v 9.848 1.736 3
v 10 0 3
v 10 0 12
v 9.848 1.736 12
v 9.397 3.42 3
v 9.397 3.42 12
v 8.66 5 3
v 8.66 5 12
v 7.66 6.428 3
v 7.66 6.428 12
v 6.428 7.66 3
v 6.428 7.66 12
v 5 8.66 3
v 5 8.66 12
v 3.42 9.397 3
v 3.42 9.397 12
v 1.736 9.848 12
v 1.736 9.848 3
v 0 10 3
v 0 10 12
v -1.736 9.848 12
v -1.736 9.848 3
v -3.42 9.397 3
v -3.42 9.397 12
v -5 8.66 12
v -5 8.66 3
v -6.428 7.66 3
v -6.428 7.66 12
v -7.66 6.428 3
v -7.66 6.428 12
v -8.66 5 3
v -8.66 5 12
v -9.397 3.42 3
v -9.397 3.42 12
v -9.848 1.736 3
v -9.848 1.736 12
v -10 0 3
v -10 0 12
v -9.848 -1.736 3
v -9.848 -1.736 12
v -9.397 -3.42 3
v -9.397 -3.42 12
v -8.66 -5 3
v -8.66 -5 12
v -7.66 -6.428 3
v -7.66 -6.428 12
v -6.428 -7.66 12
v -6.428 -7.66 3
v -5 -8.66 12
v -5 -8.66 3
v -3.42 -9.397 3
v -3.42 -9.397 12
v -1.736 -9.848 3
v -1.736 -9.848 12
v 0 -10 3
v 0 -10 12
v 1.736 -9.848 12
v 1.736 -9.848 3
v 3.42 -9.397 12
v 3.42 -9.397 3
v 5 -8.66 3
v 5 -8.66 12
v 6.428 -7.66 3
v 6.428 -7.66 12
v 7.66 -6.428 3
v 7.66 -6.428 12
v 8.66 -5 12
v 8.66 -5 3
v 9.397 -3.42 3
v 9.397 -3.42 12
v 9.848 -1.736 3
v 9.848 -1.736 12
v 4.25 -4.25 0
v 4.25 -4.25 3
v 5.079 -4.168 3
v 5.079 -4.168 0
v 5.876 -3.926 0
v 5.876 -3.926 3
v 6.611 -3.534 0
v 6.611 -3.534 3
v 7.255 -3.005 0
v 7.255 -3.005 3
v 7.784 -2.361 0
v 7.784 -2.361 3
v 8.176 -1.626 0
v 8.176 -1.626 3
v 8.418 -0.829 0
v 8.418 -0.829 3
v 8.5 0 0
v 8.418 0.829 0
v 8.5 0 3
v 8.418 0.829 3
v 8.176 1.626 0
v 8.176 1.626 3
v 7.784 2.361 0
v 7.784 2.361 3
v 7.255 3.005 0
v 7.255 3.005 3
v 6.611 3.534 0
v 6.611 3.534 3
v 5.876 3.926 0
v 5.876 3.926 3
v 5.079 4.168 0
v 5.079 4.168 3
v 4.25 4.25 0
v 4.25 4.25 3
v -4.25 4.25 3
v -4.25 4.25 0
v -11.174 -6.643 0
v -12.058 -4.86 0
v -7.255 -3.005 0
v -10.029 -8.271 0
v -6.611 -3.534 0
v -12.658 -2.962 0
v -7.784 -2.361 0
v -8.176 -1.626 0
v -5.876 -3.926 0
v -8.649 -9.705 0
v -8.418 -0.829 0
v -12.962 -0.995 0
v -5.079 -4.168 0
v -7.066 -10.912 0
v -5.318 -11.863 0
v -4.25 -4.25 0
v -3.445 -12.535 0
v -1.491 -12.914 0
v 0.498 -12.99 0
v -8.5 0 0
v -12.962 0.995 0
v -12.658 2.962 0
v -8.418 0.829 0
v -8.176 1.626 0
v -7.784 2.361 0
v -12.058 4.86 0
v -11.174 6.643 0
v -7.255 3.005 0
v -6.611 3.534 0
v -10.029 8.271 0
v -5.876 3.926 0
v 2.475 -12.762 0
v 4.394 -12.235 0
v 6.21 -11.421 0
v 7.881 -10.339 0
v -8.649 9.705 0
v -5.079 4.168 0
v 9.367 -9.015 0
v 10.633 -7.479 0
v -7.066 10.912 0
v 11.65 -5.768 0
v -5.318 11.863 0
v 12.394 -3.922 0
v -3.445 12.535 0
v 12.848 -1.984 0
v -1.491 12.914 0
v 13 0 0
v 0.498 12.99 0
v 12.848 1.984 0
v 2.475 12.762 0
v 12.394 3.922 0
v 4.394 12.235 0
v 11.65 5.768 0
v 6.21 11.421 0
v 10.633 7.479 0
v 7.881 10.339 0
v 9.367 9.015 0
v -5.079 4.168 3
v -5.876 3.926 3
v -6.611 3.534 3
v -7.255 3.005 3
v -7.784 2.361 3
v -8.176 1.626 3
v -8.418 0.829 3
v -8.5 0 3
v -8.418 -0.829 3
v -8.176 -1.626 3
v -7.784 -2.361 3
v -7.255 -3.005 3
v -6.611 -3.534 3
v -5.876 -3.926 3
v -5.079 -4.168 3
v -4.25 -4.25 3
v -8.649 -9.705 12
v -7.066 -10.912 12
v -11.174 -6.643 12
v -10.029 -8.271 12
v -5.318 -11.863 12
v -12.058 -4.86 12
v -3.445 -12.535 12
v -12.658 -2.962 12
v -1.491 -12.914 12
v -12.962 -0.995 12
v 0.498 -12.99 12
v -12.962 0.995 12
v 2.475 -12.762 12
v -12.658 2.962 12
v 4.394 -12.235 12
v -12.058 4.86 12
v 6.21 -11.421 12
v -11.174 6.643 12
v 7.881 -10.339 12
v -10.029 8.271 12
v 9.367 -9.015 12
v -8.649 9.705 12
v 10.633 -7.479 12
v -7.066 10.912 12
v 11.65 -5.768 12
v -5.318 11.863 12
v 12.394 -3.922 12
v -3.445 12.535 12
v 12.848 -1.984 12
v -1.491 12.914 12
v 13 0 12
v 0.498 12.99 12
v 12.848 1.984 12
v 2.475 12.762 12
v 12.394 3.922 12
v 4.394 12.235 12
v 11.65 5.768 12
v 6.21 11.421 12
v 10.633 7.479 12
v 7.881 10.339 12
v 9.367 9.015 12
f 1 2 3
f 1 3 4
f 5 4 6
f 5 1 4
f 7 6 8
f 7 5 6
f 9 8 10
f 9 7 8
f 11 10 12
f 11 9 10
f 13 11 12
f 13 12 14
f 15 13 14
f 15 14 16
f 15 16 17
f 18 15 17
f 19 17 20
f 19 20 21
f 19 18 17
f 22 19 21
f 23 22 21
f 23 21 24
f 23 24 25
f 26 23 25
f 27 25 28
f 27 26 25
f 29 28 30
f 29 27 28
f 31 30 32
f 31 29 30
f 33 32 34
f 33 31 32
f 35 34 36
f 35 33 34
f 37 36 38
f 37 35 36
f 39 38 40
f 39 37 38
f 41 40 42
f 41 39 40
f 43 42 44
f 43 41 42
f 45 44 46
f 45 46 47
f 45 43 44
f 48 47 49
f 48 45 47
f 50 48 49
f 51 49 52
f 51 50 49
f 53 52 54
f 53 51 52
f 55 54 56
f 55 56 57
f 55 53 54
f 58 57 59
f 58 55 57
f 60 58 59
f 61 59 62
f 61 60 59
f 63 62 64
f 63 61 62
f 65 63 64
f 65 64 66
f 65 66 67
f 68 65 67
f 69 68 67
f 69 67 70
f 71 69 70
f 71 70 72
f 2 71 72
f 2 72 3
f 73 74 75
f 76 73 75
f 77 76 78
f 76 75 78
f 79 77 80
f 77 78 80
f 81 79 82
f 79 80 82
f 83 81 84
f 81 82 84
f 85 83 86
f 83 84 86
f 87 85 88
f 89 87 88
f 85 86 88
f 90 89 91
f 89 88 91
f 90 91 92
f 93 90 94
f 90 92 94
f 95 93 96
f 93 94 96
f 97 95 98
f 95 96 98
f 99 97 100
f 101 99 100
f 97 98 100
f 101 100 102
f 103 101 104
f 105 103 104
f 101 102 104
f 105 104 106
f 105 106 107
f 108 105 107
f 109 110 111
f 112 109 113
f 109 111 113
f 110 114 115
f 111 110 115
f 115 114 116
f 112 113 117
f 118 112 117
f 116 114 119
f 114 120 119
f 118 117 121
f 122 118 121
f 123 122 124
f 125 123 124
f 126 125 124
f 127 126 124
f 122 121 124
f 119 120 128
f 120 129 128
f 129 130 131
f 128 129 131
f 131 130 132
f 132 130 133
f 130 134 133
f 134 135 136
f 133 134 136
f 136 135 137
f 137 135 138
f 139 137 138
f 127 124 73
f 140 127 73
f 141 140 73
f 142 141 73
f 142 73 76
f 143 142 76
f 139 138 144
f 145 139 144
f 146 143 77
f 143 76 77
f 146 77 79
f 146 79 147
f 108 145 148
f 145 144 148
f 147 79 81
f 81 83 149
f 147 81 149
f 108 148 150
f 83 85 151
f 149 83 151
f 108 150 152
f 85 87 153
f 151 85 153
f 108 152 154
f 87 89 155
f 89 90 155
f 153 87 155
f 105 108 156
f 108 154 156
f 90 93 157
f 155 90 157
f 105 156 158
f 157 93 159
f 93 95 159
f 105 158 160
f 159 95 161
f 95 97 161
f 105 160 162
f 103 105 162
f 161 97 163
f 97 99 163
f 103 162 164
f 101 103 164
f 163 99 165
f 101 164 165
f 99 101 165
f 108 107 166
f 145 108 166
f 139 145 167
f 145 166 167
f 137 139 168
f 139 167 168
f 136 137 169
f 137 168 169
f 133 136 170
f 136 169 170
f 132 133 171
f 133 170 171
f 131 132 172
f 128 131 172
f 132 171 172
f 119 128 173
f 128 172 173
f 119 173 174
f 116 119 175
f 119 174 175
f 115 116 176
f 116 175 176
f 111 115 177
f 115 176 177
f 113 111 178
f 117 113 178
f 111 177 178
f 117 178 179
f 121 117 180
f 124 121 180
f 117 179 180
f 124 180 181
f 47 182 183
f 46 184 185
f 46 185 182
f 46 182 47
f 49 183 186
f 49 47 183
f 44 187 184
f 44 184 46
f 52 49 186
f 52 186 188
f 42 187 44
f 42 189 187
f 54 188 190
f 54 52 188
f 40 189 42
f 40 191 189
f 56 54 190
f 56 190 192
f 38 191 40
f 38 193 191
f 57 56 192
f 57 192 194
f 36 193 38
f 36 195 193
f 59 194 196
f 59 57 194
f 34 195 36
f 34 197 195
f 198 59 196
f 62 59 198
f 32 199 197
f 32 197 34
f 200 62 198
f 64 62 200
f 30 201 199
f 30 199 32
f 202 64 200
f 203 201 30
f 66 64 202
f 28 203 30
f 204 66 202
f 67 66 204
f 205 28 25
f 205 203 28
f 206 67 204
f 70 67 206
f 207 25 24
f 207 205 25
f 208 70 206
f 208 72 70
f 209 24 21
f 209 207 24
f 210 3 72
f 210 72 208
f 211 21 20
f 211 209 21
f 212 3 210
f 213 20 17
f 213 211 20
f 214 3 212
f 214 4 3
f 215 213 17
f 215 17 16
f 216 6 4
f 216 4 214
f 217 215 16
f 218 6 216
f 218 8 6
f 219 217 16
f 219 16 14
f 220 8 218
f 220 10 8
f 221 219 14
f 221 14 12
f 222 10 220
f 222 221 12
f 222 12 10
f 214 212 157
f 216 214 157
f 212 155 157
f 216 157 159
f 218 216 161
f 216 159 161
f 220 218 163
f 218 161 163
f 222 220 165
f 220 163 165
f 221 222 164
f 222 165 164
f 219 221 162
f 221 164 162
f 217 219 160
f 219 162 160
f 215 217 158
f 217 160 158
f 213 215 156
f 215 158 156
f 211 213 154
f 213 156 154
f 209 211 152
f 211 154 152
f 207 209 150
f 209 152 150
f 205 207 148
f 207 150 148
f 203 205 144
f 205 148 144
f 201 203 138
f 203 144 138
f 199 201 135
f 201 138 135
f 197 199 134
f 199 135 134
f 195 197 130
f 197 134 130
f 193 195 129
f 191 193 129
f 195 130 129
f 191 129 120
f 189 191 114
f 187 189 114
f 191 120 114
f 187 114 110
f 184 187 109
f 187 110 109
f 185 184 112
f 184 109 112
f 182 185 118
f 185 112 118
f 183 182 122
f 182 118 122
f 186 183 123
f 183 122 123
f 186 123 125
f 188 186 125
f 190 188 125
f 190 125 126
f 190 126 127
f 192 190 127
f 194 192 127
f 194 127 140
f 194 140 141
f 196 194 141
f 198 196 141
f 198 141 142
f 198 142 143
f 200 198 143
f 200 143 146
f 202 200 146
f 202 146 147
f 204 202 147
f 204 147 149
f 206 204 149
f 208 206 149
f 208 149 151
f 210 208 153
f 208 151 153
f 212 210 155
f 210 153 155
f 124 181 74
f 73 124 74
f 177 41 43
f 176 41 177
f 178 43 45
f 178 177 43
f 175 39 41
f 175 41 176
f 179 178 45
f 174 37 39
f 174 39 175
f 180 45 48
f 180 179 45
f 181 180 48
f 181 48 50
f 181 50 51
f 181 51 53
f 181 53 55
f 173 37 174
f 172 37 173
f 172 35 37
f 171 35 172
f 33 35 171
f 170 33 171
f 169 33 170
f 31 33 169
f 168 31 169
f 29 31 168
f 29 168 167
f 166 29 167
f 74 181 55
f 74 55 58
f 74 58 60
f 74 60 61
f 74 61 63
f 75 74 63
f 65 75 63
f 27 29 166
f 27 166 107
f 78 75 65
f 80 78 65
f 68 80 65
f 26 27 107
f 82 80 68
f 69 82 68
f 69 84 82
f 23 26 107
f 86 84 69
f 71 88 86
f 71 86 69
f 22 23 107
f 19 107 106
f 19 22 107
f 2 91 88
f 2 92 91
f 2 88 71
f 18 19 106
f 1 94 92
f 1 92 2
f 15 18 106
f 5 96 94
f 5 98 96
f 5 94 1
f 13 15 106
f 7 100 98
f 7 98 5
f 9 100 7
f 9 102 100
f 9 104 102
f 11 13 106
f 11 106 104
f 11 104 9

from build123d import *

# Parameters (mm, degrees)
F0_R     = 13
F1_DEPTH = 3
F3_DEPTH = 3
F4_R     = 13
F4_R_2   = 10
F5_DEPTH = 9


with BuildPart() as f1:
    # F0 (on Top) → F1 (new body)
    with BuildSketch(Plane.XY):
        Circle(F0_R)
    extrude(amount=F1_DEPTH)

    # F2 (on face) → F3 (cut)
    with BuildSketch(Plane.XY.offset(3)):
        with BuildLine():
            Line((4.25, 4.25), (-4.25, 4.25))
            ThreePointArc((-4.25, 4.25), (-8.5, 0), (-4.25, -4.25))
            Line((-4.25, -4.25), (4.25, -4.25))
            ThreePointArc((4.25, -4.25), (8.5, 0), (4.25, 4.25))
        make_face()
    extrude(amount=-F3_DEPTH, mode=Mode.SUBTRACT)

    # F4 (on face) → F5 (join)
    with BuildSketch(Plane.XY.offset(3)):
        Circle(F4_R)
        Circle(F4_R_2, mode=Mode.SUBTRACT)
    extrude(amount=F5_DEPTH)


solid = f1.part
